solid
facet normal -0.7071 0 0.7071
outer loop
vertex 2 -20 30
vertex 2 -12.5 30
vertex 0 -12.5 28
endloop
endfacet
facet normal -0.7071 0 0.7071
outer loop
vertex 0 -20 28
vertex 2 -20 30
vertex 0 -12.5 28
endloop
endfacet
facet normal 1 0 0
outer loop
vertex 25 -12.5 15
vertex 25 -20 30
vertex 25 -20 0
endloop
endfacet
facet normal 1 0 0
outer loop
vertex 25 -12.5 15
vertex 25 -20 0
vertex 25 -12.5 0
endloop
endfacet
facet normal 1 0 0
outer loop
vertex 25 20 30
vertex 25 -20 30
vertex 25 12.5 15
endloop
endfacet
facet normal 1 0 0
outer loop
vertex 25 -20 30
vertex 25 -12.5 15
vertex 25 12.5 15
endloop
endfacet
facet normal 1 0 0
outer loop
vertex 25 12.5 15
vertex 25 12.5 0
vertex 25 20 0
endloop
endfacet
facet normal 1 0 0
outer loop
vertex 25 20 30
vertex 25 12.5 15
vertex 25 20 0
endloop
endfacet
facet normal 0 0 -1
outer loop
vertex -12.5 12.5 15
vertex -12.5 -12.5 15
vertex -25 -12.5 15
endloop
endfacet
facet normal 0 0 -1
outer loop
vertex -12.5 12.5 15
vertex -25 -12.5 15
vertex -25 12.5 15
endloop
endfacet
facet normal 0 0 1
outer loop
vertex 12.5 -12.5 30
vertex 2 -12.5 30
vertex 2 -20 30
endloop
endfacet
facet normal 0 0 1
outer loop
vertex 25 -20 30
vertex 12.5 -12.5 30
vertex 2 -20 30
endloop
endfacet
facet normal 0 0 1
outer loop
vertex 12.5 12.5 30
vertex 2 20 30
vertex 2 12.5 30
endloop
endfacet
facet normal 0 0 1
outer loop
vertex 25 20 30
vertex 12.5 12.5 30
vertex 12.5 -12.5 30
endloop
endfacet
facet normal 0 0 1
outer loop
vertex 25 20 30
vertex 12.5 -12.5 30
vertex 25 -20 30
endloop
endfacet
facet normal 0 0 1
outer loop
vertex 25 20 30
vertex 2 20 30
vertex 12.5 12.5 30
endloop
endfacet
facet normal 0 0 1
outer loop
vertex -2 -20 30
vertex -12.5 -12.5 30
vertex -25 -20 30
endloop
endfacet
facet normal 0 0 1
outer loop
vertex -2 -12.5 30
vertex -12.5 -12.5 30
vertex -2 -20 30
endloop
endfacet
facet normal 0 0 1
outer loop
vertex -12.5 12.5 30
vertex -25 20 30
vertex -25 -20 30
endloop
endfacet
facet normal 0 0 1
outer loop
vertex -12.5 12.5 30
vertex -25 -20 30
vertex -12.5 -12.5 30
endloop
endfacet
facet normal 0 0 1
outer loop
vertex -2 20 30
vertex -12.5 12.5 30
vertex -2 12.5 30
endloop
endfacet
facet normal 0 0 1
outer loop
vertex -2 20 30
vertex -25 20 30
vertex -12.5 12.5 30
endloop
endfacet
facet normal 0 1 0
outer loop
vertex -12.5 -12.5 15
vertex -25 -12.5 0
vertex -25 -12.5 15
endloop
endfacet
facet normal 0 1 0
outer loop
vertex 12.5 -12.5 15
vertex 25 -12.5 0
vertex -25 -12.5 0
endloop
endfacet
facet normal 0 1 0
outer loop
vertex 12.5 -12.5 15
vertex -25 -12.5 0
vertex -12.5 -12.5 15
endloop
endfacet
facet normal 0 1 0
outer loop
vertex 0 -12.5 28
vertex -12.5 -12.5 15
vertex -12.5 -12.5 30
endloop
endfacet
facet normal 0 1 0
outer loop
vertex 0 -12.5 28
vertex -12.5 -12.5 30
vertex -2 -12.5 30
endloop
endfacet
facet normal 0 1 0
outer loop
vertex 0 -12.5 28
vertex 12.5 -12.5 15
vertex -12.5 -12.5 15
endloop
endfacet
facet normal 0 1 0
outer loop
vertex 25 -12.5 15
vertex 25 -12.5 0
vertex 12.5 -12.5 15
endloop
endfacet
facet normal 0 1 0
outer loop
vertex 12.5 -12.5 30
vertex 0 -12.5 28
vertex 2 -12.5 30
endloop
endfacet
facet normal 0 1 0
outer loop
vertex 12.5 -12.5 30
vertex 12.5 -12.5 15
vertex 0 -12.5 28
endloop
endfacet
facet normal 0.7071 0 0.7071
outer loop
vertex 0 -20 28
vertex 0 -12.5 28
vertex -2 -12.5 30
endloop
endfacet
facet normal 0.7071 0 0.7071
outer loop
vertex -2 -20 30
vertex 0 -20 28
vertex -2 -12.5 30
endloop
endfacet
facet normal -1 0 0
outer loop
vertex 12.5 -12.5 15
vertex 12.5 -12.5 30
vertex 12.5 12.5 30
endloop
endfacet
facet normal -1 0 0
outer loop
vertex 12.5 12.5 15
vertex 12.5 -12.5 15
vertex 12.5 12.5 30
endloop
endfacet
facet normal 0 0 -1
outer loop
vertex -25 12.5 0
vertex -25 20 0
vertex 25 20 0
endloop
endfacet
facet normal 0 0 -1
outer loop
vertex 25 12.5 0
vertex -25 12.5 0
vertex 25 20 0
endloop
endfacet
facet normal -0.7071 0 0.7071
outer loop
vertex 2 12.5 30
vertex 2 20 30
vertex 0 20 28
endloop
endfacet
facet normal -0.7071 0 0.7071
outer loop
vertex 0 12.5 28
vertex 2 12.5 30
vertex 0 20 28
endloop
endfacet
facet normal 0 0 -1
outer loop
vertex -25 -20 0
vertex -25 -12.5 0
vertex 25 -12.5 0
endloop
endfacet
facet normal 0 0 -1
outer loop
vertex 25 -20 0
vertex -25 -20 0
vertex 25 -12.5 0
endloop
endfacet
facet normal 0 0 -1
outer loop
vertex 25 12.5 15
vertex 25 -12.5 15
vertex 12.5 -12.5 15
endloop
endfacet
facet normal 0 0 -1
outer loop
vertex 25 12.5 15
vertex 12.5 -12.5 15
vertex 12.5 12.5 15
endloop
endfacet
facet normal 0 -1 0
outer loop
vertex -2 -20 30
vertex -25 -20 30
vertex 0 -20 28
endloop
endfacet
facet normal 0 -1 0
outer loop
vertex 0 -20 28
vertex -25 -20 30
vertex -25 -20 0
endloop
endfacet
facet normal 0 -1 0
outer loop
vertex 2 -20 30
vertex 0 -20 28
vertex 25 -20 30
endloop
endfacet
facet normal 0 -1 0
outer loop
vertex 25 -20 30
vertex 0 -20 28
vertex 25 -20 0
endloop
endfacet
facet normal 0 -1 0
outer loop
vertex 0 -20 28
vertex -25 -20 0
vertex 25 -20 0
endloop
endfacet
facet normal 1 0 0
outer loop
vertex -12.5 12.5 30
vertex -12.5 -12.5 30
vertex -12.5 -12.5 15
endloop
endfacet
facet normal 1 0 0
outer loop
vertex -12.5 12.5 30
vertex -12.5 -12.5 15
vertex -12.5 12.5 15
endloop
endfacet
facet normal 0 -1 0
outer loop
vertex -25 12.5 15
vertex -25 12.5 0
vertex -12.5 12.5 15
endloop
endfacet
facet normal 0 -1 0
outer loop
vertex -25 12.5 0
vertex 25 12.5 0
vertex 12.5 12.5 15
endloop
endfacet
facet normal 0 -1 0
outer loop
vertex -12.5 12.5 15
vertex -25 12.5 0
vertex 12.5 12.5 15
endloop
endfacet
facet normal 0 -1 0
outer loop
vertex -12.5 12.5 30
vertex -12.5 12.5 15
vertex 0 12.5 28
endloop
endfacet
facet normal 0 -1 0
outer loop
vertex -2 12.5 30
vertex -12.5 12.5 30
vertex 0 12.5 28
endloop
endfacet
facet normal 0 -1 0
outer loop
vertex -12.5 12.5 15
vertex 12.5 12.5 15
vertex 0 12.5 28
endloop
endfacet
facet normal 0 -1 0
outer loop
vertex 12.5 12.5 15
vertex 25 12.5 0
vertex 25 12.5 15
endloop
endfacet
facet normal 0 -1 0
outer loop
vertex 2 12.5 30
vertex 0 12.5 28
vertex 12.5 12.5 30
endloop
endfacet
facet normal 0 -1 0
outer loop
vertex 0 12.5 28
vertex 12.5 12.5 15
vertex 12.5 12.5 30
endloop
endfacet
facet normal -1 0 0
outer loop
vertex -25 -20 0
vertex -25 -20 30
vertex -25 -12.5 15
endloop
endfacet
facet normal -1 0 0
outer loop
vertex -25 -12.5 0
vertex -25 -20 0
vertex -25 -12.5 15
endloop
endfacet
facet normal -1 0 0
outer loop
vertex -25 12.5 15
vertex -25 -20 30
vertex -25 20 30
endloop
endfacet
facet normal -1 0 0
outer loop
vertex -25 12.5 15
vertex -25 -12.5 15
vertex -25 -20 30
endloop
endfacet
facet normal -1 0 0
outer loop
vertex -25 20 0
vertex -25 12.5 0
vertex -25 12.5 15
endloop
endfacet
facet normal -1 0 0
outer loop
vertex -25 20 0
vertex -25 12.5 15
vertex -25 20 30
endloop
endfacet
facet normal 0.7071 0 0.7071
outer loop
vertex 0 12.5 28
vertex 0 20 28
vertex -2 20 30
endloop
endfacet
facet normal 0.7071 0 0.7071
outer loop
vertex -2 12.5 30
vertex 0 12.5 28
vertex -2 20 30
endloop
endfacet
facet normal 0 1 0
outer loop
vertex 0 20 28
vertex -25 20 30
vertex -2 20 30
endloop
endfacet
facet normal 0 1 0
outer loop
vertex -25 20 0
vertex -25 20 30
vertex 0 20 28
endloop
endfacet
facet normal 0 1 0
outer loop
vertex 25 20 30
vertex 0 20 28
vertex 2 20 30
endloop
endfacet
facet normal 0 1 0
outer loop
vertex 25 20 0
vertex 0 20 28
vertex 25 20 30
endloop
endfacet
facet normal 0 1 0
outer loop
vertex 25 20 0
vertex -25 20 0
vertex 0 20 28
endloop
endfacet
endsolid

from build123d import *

# Parameters (mm, degrees)
F0_W     = 50
F0_H     = 40
F1_DEPTH = 30
F2_W     = 25
F2_H     = 30
F3_DEPTH = 50.001
F4_W     = 25
F4_H     = 25
F5_DEPTH = 30.001
F7_DEPTH = 40.001


with BuildPart() as f1:
    # F0 (on Top) → F1 (new body)
    with BuildSketch(Plane.XY):
        Rectangle(F0_W, F0_H)
    extrude(amount=F1_DEPTH)

    # F2 (on face) → F3 (cut, through all)
    with BuildSketch(Plane.YZ.offset(25)):
        Rectangle(F2_W, F2_H)
    extrude(amount=-F3_DEPTH, mode=Mode.SUBTRACT)

    # F4 (on face) → F5 (cut, through all)
    with BuildSketch(Plane.XY.offset(30)):
        Rectangle(F4_W, F4_H)
    extrude(amount=-F5_DEPTH, mode=Mode.SUBTRACT)

    # F6 (on face) → F7 (cut, through all)
    with BuildSketch(Plane(origin=(0, 20, 0), x_dir=(-1, 0, 0), z_dir=(0, 1, 0))):
        Polygon((2, 30), (0, 30), (-2, 30), (0, 28), align=None)
    extrude(amount=-F7_DEPTH, mode=Mode.SUBTRACT)


solid = f1.part
